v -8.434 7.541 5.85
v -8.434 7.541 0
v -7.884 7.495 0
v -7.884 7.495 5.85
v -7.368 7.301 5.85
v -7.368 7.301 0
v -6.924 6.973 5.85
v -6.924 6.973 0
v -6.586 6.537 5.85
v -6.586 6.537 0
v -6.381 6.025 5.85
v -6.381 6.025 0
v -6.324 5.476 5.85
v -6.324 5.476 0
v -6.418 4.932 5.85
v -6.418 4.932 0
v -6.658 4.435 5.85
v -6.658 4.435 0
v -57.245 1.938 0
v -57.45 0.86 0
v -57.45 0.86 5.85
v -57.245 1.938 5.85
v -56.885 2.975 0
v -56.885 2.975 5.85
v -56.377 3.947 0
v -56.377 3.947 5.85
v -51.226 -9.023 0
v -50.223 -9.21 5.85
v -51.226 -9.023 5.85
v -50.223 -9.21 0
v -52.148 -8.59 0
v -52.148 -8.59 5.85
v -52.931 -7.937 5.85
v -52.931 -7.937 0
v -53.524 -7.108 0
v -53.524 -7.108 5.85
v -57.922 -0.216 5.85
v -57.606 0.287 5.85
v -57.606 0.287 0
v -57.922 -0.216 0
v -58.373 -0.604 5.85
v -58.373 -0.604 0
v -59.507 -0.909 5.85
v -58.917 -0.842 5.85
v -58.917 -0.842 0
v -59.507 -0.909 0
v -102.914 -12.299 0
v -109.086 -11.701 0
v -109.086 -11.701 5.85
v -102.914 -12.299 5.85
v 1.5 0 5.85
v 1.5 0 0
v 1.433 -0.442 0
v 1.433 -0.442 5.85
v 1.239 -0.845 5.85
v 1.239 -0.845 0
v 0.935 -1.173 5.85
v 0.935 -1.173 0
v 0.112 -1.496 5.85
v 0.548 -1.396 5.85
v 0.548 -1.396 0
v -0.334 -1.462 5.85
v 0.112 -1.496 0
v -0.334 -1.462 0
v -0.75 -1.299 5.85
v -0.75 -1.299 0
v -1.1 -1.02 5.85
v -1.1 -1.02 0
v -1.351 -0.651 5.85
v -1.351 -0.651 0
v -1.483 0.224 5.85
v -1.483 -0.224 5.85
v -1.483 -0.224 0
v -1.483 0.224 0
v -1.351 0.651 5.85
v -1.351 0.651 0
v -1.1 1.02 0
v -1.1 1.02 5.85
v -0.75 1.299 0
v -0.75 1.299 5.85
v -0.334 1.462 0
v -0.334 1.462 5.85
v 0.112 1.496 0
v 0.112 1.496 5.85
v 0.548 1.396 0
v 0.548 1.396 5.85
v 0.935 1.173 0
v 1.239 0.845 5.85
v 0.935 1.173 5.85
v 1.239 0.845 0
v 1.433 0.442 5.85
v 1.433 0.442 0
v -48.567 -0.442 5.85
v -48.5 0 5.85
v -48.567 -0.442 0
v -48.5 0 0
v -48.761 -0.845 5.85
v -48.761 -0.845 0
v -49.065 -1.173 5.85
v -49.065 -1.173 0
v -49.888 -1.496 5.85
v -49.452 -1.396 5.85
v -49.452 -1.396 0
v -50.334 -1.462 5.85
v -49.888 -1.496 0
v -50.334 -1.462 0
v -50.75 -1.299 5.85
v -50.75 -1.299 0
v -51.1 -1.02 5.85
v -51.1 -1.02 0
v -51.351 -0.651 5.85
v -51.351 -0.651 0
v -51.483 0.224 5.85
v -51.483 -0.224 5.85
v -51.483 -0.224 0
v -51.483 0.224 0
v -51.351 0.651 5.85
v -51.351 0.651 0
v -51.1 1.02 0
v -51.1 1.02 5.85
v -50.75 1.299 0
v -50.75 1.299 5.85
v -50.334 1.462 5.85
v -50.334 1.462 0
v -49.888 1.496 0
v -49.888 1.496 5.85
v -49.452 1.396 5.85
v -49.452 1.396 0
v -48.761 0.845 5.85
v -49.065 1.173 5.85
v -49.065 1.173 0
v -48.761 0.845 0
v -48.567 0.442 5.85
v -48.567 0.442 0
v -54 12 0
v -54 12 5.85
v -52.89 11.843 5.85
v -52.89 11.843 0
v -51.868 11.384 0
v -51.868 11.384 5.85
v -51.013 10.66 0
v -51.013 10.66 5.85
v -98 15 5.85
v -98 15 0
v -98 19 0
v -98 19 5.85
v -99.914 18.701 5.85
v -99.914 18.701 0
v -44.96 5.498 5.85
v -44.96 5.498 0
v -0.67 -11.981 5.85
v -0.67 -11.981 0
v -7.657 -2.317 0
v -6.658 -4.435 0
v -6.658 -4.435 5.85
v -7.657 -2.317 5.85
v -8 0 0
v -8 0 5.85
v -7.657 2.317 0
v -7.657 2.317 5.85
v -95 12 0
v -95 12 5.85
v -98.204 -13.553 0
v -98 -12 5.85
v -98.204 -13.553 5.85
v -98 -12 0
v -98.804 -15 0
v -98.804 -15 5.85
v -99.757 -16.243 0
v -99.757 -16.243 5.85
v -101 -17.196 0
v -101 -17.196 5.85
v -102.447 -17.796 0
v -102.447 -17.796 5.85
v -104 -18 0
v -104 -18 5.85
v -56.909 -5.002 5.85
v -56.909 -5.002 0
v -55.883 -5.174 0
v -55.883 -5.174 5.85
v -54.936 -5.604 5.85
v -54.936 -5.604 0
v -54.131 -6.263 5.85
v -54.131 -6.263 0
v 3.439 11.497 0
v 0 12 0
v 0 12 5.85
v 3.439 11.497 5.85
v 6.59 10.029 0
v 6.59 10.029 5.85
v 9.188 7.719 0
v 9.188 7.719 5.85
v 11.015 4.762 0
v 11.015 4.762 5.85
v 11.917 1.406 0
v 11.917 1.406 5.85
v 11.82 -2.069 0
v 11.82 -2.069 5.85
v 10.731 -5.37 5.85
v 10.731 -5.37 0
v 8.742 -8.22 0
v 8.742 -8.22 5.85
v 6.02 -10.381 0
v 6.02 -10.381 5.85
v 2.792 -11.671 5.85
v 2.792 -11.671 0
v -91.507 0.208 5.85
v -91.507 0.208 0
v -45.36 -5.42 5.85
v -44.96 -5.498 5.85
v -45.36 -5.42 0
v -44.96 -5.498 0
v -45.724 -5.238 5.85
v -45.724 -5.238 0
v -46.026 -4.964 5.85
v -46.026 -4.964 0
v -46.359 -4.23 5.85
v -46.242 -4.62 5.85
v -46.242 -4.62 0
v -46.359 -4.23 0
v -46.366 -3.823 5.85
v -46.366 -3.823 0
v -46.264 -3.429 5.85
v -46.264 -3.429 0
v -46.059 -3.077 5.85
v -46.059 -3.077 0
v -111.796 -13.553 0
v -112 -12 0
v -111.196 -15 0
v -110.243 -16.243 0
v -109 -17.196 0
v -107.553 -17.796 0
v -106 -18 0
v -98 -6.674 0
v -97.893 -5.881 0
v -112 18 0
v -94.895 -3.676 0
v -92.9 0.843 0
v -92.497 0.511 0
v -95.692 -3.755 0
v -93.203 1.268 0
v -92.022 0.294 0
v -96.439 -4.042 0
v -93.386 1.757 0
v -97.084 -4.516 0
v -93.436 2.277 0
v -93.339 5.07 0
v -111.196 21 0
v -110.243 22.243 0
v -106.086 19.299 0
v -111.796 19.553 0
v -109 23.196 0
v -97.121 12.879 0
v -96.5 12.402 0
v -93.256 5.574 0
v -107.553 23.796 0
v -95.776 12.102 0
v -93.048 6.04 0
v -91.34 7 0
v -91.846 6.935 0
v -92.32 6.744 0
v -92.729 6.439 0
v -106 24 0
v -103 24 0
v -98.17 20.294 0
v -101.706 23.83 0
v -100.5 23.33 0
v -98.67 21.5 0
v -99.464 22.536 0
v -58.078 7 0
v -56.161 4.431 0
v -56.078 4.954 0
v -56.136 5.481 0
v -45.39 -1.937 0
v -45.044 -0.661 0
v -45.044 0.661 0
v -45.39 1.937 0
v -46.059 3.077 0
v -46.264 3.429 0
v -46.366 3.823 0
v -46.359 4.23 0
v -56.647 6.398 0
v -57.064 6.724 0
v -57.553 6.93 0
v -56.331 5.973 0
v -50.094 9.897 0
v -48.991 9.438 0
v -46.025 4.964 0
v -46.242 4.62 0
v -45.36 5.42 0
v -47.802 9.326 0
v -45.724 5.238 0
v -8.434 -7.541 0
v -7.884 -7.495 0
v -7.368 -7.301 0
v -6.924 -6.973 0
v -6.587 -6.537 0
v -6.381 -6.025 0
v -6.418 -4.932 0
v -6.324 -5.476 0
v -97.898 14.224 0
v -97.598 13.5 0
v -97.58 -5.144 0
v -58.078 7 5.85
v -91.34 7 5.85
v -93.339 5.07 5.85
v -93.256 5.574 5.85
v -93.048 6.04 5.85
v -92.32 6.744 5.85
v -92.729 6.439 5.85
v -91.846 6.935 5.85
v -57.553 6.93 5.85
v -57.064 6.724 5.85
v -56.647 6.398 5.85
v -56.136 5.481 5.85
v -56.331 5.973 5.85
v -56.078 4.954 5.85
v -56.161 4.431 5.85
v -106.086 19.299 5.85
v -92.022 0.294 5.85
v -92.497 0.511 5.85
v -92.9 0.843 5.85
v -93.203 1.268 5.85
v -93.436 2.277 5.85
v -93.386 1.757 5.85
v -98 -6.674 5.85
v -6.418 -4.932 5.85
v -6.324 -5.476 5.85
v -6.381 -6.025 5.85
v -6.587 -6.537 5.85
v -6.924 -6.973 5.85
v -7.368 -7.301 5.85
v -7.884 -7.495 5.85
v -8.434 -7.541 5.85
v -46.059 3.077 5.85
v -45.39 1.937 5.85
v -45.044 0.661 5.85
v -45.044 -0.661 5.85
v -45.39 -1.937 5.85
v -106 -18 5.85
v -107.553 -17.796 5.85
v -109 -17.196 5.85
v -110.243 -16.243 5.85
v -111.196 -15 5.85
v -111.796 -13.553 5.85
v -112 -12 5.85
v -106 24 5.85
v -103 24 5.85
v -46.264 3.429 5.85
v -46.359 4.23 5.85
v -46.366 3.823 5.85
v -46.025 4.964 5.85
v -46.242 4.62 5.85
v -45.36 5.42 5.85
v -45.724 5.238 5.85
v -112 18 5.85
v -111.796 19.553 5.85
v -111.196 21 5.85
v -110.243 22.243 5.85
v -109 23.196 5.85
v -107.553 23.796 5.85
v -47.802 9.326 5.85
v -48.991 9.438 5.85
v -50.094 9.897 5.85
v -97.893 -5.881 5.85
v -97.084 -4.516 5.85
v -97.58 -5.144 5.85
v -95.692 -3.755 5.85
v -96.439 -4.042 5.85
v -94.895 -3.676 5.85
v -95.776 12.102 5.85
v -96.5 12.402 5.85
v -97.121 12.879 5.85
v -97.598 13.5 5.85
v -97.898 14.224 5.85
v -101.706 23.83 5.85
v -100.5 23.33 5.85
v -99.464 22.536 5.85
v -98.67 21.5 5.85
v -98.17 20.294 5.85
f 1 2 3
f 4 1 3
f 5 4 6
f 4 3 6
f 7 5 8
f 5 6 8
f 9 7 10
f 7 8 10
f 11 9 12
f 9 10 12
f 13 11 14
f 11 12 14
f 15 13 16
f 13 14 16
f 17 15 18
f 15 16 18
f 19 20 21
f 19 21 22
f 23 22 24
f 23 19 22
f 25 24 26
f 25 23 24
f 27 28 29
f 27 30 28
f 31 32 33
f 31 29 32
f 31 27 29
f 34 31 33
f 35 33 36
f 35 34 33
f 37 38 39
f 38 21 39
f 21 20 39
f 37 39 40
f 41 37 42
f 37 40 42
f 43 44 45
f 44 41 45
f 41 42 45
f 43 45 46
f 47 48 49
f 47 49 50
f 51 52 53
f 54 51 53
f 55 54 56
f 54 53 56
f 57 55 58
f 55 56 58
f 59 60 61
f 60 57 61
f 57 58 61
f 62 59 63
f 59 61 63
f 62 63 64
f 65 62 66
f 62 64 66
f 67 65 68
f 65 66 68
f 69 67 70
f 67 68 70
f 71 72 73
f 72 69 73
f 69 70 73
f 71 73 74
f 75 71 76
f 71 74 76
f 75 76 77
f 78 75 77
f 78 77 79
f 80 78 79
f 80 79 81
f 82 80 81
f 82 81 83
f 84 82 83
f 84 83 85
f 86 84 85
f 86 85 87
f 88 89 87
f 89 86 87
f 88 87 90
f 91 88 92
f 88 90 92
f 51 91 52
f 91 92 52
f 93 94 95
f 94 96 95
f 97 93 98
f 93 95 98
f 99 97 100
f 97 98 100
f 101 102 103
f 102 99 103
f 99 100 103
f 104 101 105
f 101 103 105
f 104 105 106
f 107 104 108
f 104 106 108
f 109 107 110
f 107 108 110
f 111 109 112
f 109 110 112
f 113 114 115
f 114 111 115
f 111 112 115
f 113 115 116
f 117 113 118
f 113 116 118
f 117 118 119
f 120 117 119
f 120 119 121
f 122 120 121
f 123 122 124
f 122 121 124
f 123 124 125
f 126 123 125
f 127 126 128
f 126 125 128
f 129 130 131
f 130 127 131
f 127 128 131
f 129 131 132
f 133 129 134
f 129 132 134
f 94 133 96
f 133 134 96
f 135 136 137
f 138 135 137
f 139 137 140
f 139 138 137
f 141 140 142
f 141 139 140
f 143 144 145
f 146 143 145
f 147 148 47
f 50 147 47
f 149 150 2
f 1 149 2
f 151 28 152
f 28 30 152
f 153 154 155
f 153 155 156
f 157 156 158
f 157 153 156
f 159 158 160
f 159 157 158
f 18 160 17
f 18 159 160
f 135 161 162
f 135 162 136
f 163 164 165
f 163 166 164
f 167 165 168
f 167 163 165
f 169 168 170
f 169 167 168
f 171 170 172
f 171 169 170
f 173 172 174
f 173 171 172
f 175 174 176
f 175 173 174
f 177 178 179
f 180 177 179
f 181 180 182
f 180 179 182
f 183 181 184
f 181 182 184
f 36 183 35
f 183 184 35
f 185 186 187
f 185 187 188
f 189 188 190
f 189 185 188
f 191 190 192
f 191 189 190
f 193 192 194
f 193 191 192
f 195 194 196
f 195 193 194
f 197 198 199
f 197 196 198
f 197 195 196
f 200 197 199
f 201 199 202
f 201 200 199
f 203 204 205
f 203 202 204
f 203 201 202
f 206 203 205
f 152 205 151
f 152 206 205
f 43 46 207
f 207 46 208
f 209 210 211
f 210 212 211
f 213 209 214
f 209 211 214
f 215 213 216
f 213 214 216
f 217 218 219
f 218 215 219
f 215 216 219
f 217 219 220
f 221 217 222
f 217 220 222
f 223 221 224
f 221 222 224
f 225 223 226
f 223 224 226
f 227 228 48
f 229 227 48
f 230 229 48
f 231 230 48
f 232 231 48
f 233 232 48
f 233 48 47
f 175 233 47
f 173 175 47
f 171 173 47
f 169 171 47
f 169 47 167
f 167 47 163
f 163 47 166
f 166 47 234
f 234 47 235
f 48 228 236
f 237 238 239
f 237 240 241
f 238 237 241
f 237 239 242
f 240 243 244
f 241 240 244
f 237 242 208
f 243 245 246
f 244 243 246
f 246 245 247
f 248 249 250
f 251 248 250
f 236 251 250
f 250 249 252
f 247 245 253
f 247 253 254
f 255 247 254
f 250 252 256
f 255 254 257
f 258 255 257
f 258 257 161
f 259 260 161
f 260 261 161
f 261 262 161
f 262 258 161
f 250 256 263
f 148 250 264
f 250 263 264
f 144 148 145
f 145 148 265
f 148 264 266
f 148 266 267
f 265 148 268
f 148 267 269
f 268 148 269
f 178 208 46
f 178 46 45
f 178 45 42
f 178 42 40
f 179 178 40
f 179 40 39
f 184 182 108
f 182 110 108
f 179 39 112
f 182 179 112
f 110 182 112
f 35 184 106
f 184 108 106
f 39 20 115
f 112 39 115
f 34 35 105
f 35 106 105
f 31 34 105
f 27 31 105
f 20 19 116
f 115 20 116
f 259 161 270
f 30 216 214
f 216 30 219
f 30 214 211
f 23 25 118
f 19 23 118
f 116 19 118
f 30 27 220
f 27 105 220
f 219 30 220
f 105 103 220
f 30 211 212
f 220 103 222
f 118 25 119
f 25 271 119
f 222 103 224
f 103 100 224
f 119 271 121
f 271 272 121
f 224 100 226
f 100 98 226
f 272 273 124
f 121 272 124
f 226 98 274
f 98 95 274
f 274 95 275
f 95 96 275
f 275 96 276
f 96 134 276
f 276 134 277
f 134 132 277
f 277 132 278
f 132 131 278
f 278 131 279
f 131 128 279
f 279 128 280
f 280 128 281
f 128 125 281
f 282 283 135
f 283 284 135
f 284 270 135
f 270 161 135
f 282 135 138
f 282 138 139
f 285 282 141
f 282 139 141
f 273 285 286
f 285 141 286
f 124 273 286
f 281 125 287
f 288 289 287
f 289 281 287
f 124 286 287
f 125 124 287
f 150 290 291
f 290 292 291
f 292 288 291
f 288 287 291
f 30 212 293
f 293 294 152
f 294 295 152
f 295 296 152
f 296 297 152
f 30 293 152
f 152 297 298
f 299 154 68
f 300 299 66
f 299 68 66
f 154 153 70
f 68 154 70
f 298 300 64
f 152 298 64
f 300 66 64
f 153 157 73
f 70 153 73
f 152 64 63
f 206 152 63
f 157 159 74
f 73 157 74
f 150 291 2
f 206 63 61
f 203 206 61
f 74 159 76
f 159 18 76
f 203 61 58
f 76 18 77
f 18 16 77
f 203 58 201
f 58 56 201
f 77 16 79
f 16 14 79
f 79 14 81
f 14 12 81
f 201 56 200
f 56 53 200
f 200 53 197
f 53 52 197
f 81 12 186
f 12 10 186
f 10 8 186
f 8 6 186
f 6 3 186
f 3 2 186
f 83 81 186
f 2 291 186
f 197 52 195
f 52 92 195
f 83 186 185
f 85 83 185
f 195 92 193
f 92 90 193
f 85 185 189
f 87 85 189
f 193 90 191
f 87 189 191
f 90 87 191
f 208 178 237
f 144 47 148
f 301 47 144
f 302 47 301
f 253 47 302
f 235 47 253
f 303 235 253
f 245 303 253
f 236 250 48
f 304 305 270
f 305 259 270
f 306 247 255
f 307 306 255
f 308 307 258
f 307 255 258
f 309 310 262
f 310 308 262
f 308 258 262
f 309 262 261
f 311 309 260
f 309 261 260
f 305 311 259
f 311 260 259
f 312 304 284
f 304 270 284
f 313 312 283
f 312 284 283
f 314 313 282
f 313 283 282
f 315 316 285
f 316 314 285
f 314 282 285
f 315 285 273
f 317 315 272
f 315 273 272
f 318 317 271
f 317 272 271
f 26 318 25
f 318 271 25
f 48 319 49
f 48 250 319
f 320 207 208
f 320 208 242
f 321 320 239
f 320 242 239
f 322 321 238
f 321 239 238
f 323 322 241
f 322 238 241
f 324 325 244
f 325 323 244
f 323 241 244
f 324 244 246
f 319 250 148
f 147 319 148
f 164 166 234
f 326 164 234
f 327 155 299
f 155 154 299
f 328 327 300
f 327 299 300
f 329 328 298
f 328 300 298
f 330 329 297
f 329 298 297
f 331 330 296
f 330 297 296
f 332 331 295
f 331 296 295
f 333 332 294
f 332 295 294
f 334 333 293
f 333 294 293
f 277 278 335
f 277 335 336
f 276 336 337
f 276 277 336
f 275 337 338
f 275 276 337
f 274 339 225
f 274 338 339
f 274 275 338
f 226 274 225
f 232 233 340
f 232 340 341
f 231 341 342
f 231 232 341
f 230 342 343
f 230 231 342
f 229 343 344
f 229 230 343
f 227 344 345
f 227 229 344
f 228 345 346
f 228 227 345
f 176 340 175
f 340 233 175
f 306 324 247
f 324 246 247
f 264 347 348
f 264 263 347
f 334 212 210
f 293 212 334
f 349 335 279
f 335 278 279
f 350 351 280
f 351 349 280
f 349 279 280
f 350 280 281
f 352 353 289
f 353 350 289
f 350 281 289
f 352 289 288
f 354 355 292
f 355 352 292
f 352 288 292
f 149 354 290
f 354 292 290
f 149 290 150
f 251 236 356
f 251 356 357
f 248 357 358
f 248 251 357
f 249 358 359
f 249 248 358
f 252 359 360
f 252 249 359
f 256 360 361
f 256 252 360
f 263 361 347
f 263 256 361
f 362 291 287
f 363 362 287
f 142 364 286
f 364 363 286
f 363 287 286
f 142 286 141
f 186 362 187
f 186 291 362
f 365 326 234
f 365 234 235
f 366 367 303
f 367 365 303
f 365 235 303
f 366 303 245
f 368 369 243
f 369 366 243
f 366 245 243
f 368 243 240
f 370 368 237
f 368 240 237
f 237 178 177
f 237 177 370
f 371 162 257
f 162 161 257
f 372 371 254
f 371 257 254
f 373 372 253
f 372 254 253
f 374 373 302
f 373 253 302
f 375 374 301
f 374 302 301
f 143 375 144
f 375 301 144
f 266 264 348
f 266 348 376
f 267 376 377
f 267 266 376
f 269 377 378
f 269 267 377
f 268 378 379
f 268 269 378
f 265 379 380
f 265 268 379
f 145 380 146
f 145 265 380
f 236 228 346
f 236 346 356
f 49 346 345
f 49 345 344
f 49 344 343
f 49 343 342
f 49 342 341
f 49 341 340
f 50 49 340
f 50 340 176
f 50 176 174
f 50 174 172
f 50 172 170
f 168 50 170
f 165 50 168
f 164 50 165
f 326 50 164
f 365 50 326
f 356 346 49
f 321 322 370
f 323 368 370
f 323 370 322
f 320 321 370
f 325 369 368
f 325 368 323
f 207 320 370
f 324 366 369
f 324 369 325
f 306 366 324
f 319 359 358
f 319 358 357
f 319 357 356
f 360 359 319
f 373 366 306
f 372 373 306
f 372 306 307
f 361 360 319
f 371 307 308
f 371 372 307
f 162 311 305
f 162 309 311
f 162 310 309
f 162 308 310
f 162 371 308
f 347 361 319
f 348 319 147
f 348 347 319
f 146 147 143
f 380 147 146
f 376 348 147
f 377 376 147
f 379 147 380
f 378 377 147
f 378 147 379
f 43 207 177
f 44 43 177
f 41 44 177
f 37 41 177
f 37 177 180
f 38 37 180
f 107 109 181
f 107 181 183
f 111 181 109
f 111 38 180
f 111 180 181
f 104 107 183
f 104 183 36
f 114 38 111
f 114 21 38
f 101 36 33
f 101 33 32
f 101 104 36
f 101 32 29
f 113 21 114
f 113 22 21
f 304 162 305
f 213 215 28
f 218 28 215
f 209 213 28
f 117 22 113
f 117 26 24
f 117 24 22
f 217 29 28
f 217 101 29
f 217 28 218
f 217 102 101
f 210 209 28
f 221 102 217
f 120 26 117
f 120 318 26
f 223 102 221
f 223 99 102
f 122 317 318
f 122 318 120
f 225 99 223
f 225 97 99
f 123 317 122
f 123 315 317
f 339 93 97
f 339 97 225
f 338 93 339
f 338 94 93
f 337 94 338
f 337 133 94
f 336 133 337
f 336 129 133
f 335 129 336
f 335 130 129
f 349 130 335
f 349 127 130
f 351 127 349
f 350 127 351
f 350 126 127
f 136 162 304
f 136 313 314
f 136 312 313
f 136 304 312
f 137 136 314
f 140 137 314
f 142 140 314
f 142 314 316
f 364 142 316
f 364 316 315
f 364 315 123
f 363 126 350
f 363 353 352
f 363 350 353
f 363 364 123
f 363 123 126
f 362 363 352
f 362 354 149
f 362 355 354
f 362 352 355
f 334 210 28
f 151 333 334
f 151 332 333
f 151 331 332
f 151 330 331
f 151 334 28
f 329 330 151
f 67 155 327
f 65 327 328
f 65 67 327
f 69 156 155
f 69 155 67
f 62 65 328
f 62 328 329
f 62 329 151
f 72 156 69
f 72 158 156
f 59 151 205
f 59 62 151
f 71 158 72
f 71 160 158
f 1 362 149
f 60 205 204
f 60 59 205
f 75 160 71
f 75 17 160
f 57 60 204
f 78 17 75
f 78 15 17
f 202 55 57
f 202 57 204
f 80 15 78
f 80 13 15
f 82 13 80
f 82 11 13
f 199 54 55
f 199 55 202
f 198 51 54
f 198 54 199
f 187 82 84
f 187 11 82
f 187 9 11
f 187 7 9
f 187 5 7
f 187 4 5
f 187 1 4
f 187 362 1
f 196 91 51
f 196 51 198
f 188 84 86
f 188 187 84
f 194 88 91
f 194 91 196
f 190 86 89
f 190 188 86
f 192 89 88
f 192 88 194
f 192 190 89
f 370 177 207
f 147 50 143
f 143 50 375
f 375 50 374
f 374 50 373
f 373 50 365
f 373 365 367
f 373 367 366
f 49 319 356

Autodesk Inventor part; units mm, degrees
ref_plane "YZ Plane" through (0, 0, 0) normal (1, 0, 0) x (0, 1, 0)
ref_plane "XZ Plane" through (0, 0, 0) normal (0, 1, 0) x (-1, 0, 0)
ref_plane "XY Plane" through (0, 0, 0) normal (0, 0, 1) x (1, 0, 0)
sketch "Sketch1" plane through (0, 0, 0) normal (0, 0, 1) x (1, 0, 0)
  circle A0 centre (0, 0) radius 1.5
  arc A1 (-0.6702, -11.9813) -> (0, 12) centre (0, 0) ccw
  circle A2 centre (-50, 0) radius 1.5
  arc A3 (-6.6581, 4.4351) -> (-6.6581, -4.4351) centre (0, 0) ccw
  line L0 (-44.9603, 5.4977) -> (-8.4343, 7.5407)
  line L1 (-44.9603, -5.4977) -> (-8.4343, -7.5407)
  arc A4 (-44.9603, 5.4977) -> (-46.0589, 3.0769) centre (-44.8765, 4) ccw
  arc A5 (-46.0589, -3.0769) -> (-44.9603, -5.4977) centre (-44.8765, -4) ccw
  arc A6 (-6.6581, 4.4351) -> (-8.4343, 7.5407) centre (-8.3226, 5.5439) ccw
  arc A7 (-8.4343, -7.5407) -> (-6.6581, -4.4351) centre (-8.3226, -5.5439) ccw
  line L2 (-104, 0) -> (-57, 0) construction
  line L3 (-106, -18) -> (-104, -18)
  line L4 (-98, -12) -> (-98, -6.6741)
  line L5 (-112, -12) -> (-112, 18)
  arc A8 (-94.8953, -3.6759) -> (-98, -6.6741) centre (-95, -6.6741) ccw
  arc A9 (-106, 24) -> (-112, 18) centre (-106, 18) ccw
  arc A10 (-112, -12) -> (-106, -18) centre (-106, -12) ccw
  arc A11 (-104, -18) -> (-98, -12) centre (-104, -12) ccw
  arc A12 (-46.0589, -3.0769) -> (-46.0589, 3.0769) centre (-50, 0) ccw
  line L6 (-103, 19) -> (-106, -12) construction
  line L7 (-106.0856, 19.2986) -> (-109.0856, -11.7014)
  line L8 (-109.0856, -11.7014) -> (-102.9144, -12.2986)
  line L9 (-106.0856, 19.2986) -> (-99.9144, 18.7014)
  line L10 (-99.9144, 18.7014) -> (-102.9144, -12.2986)
  line L11 (-106, 24) -> (-103, 24)
  arc A13 (-98, 15) -> (-95, 12) centre (-95, 15) ccw
  line L12 (-95, 12) -> (-54, 12)
  line L13 (-47.8018, 9.3262) -> (0, 12)
  line L14 (-50.2234, -9.2095) -> (-0.6702, -11.9813)
  line L15 (-56.9088, -5.0024) -> (-94.8953, -3.6759)
  arc A14 (-51.0126, 10.66) -> (-54, 12) centre (-54, 8) ccw
  arc A15 (-51.0126, 10.66) -> (-47.8018, 9.3262) centre (-48.0252, 13.32) ccw
  arc A16 (-53.5242, -7.1079) -> (-50.2234, -9.2095) centre (-50, -5.2158) ccw
  arc A17 (-53.5242, -7.1079) -> (-56.9088, -5.0024) centre (-57.0484, -9) ccw
  line L16 (-91.3398, 7) -> (-58.0777, 7)
  line L17 (-59.5071, -0.9093) -> (-91.5071, 0.2082)
  line L18 (-93.4361, 2.2768) -> (-93.3386, 5.0698)
  arc A18 (-56.3772, 3.9474) -> (-57.4505, 0.8601) centre (-50, 0) ccw
  arc A19 (-59.5071, -0.9093) -> (-57.4505, 0.8601) centre (-59.4373, 1.0895) ccw
  arc A20 (-56.3772, 3.9474) -> (-58.0777, 7) centre (-58.0777, 5) ccw
  arc A21 (-91.3398, 7) -> (-93.3386, 5.0698) centre (-91.3398, 5) ccw
  arc A22 (-93.4361, 2.2768) -> (-91.5071, 0.2082) centre (-91.4373, 2.207) ccw
  line L19 (-98, 15) -> (-98, 19)
  arc A23 (-98, 19) -> (-103, 24) centre (-103, 19) ccw
  point P0 (-0.4468, -7.9875)
  point P1 (-94.8178, 5.6675)
  point P2 (-94.8178, 5.6675)
  point P3 (-52.6926, 7)
  point P4 (-57.4355, -0.9816)
  dimension "d0" = 3
  dimension "d2" = 12
  dimension "d10" = 50
  dimension "d14" = 16
  dimension "d18" = 2
  dimension "d31" = 7
  dimension "d42" = 3
  dimension "d43" = 6
  dimension "d52" = 14
  dimension "d53" = 98
  dimension "d57" = 18
  dimension "d60" = 24
  dimension "d61" = 3.1
  dimension "d63" = 5
  dimension "d77" = 8
  dimension "d80" = 4
  dimension "d81" = 4
  dimension "d82" = 4
  dimension "d83" = 4
  dimension "d84" = 1.5
  dimension "d85" = 9
  dimension "d86" = 4
  dimension "d87" = 8
  dimension "d88" = 178
  dimension "d90" = 5
  dimension "d91" = 4
  dimension "d92" = 7.5
  dimension "d93" = 2
  dimension "d94" = 2
  dimension "d95" = 32
  dimension "d96" = 5
extrude "Extrusion1" add sketch "Sketch1" along normal blind 5.85
properties part number "tipper_link_C"
